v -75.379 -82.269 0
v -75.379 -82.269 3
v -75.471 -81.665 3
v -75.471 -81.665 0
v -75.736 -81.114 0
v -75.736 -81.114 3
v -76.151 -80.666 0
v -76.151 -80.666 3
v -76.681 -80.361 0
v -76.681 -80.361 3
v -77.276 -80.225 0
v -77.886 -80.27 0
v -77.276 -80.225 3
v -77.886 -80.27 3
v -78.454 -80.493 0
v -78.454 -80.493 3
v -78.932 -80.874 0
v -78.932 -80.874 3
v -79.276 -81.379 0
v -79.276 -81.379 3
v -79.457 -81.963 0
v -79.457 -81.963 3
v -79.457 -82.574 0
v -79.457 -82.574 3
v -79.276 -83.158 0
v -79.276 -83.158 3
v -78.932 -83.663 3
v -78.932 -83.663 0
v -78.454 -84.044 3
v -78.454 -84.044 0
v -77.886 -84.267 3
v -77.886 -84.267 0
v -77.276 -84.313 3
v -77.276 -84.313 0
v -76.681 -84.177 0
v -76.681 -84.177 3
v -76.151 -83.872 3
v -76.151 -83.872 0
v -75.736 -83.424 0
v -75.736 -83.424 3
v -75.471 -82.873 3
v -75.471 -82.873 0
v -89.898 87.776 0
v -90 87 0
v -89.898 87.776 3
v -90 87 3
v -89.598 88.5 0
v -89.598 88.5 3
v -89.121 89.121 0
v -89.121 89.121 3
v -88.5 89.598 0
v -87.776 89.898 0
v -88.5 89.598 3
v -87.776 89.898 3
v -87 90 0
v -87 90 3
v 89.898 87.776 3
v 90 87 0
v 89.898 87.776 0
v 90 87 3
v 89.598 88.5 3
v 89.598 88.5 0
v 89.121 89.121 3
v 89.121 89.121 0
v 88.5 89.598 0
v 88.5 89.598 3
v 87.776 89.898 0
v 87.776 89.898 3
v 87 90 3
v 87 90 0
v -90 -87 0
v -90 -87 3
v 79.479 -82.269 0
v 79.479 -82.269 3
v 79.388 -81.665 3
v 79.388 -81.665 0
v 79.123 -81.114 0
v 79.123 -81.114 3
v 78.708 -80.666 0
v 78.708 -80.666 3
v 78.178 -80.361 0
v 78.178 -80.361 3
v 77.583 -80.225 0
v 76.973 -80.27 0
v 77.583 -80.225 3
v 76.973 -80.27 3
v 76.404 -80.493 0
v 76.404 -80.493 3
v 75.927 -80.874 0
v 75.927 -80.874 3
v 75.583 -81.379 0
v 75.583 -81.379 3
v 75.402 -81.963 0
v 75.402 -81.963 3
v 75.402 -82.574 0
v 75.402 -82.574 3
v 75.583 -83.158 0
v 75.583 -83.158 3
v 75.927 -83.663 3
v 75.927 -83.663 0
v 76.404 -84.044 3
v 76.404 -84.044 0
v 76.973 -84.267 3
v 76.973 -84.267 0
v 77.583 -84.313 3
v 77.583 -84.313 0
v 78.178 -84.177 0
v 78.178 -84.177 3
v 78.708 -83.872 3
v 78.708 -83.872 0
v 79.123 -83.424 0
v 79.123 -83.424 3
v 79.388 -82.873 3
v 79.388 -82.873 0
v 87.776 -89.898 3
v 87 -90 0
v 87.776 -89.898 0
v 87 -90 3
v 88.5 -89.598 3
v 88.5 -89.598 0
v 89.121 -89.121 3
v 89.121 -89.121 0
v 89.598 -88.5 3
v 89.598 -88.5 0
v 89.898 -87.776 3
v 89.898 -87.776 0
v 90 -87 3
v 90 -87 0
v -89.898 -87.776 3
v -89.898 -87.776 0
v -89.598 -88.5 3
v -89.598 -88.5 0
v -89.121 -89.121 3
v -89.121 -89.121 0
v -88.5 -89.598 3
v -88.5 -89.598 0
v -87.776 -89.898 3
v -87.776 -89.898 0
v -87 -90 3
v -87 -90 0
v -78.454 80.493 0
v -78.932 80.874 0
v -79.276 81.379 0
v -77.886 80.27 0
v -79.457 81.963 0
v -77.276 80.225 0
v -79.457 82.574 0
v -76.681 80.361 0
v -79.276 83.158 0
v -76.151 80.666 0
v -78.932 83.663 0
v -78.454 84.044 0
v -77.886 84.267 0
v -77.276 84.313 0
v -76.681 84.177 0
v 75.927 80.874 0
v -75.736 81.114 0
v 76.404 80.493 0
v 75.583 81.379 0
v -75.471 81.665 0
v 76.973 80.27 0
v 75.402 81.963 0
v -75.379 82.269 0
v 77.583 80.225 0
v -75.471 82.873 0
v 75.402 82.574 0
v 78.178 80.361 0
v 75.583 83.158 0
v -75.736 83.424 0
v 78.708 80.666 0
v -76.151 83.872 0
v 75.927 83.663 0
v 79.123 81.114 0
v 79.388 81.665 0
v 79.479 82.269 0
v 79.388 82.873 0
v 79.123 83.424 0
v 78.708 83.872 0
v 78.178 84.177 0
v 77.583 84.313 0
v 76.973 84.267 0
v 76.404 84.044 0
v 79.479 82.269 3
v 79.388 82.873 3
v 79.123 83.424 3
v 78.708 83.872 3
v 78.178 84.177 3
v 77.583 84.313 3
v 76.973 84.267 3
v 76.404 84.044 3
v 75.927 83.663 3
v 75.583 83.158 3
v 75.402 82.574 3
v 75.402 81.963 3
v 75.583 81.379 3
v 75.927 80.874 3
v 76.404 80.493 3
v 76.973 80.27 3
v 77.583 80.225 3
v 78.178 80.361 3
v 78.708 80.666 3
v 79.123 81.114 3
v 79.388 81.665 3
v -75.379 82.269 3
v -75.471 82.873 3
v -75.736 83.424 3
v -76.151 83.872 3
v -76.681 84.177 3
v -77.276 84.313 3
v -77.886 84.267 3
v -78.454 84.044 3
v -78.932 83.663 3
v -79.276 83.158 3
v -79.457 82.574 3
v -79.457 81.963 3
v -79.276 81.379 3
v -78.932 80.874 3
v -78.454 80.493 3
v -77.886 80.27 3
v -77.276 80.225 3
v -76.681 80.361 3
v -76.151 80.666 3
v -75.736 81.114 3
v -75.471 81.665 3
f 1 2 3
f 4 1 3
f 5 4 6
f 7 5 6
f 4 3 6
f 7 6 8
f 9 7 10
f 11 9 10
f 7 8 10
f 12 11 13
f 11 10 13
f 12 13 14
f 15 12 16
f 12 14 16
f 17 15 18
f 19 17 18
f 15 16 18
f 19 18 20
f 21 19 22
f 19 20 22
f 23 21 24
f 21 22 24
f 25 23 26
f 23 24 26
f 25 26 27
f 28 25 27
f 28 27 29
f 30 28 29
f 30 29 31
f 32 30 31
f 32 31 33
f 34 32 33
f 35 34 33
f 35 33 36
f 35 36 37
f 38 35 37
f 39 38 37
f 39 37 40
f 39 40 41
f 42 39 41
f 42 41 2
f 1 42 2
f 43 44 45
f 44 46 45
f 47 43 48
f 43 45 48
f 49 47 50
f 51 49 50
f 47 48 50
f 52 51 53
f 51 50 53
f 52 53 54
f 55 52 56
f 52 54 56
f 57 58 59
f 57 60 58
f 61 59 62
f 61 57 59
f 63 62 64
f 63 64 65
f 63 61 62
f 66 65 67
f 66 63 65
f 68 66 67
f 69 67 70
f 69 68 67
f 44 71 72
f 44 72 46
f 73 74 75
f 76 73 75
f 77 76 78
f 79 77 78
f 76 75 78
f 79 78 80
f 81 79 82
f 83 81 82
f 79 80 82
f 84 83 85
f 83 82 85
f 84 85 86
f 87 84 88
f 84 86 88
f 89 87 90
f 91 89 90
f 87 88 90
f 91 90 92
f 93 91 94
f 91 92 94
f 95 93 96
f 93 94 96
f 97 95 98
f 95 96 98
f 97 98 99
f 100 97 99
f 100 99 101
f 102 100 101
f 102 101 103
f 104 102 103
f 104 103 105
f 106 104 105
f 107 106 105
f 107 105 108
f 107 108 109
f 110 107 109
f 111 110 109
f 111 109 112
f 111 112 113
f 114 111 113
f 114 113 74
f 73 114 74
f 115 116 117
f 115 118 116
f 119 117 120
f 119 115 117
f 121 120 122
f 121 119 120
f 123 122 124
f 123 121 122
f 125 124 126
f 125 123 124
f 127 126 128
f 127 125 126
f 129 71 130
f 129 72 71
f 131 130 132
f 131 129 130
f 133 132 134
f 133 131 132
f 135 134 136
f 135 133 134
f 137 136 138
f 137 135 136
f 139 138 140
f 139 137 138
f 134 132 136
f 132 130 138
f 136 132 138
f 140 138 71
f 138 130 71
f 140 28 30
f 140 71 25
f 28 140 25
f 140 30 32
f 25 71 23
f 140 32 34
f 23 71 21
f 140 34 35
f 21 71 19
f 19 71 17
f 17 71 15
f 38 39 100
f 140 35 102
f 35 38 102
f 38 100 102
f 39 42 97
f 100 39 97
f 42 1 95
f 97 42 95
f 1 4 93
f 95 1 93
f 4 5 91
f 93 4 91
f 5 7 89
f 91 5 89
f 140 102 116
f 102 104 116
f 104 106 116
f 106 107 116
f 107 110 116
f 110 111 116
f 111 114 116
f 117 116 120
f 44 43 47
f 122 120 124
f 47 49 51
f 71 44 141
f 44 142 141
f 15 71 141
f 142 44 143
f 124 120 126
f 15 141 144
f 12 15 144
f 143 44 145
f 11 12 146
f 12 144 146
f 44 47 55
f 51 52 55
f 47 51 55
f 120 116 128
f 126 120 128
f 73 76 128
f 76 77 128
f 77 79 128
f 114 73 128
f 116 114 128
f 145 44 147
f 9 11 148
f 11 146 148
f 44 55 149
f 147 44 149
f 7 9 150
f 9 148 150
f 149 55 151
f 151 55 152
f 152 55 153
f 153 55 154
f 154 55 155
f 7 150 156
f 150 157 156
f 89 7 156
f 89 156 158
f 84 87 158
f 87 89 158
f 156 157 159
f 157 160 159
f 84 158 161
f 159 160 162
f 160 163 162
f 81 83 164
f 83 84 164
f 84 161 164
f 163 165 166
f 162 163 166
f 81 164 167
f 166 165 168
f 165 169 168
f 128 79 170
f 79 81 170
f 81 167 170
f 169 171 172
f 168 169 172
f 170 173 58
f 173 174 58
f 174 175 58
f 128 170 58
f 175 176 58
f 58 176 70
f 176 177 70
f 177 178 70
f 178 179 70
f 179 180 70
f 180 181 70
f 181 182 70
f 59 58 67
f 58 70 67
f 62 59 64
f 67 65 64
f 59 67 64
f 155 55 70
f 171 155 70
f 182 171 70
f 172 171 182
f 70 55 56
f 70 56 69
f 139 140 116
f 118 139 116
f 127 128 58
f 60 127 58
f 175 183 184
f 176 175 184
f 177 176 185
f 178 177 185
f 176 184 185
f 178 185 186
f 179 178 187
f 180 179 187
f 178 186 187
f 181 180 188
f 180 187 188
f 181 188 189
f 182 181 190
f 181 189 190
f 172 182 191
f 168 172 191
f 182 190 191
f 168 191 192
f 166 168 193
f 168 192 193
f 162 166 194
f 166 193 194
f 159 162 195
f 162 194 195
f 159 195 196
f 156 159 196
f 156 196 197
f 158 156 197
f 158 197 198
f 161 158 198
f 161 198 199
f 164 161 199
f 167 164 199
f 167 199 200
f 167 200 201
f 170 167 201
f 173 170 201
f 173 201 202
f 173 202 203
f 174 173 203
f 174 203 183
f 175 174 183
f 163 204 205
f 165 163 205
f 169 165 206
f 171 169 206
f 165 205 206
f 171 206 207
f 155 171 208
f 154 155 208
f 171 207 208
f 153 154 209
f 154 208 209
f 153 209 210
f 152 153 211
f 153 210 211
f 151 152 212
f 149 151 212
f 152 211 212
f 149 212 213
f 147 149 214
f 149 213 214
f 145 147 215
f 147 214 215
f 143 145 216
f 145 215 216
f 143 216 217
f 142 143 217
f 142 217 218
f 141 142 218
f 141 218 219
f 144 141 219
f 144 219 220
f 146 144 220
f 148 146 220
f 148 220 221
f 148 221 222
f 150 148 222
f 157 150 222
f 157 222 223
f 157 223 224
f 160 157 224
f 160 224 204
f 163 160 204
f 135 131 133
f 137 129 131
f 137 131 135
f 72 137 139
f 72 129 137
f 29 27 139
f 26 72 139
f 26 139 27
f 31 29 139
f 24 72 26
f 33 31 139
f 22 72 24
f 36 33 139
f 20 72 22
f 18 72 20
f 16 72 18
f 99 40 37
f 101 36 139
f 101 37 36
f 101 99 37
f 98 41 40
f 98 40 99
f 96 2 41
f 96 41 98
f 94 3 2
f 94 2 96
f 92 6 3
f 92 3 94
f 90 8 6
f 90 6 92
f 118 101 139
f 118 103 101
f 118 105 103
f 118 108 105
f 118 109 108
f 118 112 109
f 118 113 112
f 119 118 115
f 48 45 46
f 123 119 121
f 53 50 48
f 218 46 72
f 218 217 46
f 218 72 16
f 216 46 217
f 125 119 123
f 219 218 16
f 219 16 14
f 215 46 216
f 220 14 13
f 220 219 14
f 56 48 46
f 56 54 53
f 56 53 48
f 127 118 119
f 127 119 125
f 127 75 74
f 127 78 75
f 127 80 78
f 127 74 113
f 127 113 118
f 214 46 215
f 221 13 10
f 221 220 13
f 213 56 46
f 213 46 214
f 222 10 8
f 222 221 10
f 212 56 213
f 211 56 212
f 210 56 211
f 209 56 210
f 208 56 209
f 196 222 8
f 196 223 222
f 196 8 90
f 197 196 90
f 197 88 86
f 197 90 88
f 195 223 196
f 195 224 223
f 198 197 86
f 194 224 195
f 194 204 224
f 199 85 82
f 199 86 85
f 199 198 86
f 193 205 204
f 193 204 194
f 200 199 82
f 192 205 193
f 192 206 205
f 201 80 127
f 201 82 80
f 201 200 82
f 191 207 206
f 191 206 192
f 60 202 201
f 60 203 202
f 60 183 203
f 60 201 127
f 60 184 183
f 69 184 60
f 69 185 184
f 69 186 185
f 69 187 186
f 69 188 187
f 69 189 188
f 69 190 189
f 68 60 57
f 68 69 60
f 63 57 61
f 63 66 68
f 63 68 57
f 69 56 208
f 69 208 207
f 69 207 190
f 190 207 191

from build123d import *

# Parameters (mm, degrees)
SKETCH1_W           = 180
SKETCH1_H           = 180
BOSS_EXTRUDE1_DEPTH = 3
FILLET1_R           = 3
CUT_EXTRUDE_1_REACH = 129.315
SKETCH_1_R          = 2.05


with BuildPart() as part:
    # Sketch1 → Boss-Extrude1 (new body)
    with BuildSketch(Plane.XY):
        Rectangle(SKETCH1_W, SKETCH1_H)
    extrude(amount=BOSS_EXTRUDE1_DEPTH)

    # Fillet1
    fillet1_edges = [part.edges().sort_by_distance(p)[0] for p in [
        (90, -90, 1.5),
        (-90, -90, 1.5),
        (-90, 90, 1.5),
        (90, 90, 1.5),
    ]]
    fillet(fillet1_edges, radius=FILLET1_R)

    # 草图1 → 切除-拉伸1 (cut, up to next)
    with BuildSketch(Plane.XY.offset(3), mode=Mode.PRIVATE) as cut_extrude_1_sk1:
        with Locations((-77.42949016, 82.268833295)):
            Circle(SKETCH_1_R)
    cut_extrude_1_tool1 = extrude(cut_extrude_1_sk1.sketch, amount=-CUT_EXTRUDE_1_REACH, mode=Mode.PRIVATE) & part.part
    # 草图1 → 切除-拉伸1 (cut, up to next)
    with BuildSketch(Plane.XY.offset(3), mode=Mode.PRIVATE) as cut_extrude_1_sk2:
        with Locations((77.42949016, 82.268833295)):
            Circle(SKETCH_1_R)
    cut_extrude_1_tool2 = extrude(cut_extrude_1_sk2.sketch, amount=-CUT_EXTRUDE_1_REACH, mode=Mode.PRIVATE) & part.part
    # 草图1 → 切除-拉伸1 (cut, up to next)
    with BuildSketch(Plane.XY.offset(3), mode=Mode.PRIVATE) as cut_extrude_1_sk3:
        with Locations((77.42949016, -82.268833295)):
            Circle(SKETCH_1_R)
    cut_extrude_1_tool3 = extrude(cut_extrude_1_sk3.sketch, amount=-CUT_EXTRUDE_1_REACH, mode=Mode.PRIVATE) & part.part
    # 草图1 → 切除-拉伸1 (cut, up to next)
    with BuildSketch(Plane.XY.offset(3), mode=Mode.PRIVATE) as cut_extrude_1_sk4:
        with Locations((-77.42949016, -82.268833295)):
            Circle(SKETCH_1_R)
    cut_extrude_1_tool4 = extrude(cut_extrude_1_sk4.sketch, amount=-CUT_EXTRUDE_1_REACH, mode=Mode.PRIVATE) & part.part
    add(cut_extrude_1_tool1.solids().sort_by_distance((-77.42949, 82.268833, 3))[0], mode=Mode.SUBTRACT)
    add(cut_extrude_1_tool2.solids().sort_by_distance((77.42949, 82.268833, 3))[0], mode=Mode.SUBTRACT)
    add(cut_extrude_1_tool3.solids().sort_by_distance((77.42949, -82.268833, 3))[0], mode=Mode.SUBTRACT)
    add(cut_extrude_1_tool4.solids().sort_by_distance((-77.42949, -82.268833, 3))[0], mode=Mode.SUBTRACT)


solid = part.part
